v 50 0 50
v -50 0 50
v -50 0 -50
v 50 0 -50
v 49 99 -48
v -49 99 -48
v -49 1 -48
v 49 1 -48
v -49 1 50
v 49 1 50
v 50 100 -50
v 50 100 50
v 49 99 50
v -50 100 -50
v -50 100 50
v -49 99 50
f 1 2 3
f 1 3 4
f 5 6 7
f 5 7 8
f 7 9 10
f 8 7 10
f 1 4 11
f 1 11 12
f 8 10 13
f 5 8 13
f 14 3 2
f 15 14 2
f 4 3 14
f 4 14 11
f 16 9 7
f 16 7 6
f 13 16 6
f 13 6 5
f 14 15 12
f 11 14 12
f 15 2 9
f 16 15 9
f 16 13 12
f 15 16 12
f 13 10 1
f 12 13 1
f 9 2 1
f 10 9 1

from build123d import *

# Parameters (mm, degrees)
F0_W     = 100
F0_H     = 100
F1_DEPTH = 100
F2_W     = 98
F2_H     = 98
F3_DEPTH = 98


with BuildPart() as f1:
    # F0 (on Front) → F1 (new body)
    with BuildSketch(Plane.XZ):
        Rectangle(F0_W, F0_H)
    extrude(amount=-F1_DEPTH)

    # F2 (on face) → F3 (cut)
    with BuildSketch(Plane.XY.offset(50)):
        with Locations((0, 50)):
            Rectangle(F2_W, F2_H)
    extrude(amount=-F3_DEPTH, mode=Mode.SUBTRACT)


solid = f1.part
